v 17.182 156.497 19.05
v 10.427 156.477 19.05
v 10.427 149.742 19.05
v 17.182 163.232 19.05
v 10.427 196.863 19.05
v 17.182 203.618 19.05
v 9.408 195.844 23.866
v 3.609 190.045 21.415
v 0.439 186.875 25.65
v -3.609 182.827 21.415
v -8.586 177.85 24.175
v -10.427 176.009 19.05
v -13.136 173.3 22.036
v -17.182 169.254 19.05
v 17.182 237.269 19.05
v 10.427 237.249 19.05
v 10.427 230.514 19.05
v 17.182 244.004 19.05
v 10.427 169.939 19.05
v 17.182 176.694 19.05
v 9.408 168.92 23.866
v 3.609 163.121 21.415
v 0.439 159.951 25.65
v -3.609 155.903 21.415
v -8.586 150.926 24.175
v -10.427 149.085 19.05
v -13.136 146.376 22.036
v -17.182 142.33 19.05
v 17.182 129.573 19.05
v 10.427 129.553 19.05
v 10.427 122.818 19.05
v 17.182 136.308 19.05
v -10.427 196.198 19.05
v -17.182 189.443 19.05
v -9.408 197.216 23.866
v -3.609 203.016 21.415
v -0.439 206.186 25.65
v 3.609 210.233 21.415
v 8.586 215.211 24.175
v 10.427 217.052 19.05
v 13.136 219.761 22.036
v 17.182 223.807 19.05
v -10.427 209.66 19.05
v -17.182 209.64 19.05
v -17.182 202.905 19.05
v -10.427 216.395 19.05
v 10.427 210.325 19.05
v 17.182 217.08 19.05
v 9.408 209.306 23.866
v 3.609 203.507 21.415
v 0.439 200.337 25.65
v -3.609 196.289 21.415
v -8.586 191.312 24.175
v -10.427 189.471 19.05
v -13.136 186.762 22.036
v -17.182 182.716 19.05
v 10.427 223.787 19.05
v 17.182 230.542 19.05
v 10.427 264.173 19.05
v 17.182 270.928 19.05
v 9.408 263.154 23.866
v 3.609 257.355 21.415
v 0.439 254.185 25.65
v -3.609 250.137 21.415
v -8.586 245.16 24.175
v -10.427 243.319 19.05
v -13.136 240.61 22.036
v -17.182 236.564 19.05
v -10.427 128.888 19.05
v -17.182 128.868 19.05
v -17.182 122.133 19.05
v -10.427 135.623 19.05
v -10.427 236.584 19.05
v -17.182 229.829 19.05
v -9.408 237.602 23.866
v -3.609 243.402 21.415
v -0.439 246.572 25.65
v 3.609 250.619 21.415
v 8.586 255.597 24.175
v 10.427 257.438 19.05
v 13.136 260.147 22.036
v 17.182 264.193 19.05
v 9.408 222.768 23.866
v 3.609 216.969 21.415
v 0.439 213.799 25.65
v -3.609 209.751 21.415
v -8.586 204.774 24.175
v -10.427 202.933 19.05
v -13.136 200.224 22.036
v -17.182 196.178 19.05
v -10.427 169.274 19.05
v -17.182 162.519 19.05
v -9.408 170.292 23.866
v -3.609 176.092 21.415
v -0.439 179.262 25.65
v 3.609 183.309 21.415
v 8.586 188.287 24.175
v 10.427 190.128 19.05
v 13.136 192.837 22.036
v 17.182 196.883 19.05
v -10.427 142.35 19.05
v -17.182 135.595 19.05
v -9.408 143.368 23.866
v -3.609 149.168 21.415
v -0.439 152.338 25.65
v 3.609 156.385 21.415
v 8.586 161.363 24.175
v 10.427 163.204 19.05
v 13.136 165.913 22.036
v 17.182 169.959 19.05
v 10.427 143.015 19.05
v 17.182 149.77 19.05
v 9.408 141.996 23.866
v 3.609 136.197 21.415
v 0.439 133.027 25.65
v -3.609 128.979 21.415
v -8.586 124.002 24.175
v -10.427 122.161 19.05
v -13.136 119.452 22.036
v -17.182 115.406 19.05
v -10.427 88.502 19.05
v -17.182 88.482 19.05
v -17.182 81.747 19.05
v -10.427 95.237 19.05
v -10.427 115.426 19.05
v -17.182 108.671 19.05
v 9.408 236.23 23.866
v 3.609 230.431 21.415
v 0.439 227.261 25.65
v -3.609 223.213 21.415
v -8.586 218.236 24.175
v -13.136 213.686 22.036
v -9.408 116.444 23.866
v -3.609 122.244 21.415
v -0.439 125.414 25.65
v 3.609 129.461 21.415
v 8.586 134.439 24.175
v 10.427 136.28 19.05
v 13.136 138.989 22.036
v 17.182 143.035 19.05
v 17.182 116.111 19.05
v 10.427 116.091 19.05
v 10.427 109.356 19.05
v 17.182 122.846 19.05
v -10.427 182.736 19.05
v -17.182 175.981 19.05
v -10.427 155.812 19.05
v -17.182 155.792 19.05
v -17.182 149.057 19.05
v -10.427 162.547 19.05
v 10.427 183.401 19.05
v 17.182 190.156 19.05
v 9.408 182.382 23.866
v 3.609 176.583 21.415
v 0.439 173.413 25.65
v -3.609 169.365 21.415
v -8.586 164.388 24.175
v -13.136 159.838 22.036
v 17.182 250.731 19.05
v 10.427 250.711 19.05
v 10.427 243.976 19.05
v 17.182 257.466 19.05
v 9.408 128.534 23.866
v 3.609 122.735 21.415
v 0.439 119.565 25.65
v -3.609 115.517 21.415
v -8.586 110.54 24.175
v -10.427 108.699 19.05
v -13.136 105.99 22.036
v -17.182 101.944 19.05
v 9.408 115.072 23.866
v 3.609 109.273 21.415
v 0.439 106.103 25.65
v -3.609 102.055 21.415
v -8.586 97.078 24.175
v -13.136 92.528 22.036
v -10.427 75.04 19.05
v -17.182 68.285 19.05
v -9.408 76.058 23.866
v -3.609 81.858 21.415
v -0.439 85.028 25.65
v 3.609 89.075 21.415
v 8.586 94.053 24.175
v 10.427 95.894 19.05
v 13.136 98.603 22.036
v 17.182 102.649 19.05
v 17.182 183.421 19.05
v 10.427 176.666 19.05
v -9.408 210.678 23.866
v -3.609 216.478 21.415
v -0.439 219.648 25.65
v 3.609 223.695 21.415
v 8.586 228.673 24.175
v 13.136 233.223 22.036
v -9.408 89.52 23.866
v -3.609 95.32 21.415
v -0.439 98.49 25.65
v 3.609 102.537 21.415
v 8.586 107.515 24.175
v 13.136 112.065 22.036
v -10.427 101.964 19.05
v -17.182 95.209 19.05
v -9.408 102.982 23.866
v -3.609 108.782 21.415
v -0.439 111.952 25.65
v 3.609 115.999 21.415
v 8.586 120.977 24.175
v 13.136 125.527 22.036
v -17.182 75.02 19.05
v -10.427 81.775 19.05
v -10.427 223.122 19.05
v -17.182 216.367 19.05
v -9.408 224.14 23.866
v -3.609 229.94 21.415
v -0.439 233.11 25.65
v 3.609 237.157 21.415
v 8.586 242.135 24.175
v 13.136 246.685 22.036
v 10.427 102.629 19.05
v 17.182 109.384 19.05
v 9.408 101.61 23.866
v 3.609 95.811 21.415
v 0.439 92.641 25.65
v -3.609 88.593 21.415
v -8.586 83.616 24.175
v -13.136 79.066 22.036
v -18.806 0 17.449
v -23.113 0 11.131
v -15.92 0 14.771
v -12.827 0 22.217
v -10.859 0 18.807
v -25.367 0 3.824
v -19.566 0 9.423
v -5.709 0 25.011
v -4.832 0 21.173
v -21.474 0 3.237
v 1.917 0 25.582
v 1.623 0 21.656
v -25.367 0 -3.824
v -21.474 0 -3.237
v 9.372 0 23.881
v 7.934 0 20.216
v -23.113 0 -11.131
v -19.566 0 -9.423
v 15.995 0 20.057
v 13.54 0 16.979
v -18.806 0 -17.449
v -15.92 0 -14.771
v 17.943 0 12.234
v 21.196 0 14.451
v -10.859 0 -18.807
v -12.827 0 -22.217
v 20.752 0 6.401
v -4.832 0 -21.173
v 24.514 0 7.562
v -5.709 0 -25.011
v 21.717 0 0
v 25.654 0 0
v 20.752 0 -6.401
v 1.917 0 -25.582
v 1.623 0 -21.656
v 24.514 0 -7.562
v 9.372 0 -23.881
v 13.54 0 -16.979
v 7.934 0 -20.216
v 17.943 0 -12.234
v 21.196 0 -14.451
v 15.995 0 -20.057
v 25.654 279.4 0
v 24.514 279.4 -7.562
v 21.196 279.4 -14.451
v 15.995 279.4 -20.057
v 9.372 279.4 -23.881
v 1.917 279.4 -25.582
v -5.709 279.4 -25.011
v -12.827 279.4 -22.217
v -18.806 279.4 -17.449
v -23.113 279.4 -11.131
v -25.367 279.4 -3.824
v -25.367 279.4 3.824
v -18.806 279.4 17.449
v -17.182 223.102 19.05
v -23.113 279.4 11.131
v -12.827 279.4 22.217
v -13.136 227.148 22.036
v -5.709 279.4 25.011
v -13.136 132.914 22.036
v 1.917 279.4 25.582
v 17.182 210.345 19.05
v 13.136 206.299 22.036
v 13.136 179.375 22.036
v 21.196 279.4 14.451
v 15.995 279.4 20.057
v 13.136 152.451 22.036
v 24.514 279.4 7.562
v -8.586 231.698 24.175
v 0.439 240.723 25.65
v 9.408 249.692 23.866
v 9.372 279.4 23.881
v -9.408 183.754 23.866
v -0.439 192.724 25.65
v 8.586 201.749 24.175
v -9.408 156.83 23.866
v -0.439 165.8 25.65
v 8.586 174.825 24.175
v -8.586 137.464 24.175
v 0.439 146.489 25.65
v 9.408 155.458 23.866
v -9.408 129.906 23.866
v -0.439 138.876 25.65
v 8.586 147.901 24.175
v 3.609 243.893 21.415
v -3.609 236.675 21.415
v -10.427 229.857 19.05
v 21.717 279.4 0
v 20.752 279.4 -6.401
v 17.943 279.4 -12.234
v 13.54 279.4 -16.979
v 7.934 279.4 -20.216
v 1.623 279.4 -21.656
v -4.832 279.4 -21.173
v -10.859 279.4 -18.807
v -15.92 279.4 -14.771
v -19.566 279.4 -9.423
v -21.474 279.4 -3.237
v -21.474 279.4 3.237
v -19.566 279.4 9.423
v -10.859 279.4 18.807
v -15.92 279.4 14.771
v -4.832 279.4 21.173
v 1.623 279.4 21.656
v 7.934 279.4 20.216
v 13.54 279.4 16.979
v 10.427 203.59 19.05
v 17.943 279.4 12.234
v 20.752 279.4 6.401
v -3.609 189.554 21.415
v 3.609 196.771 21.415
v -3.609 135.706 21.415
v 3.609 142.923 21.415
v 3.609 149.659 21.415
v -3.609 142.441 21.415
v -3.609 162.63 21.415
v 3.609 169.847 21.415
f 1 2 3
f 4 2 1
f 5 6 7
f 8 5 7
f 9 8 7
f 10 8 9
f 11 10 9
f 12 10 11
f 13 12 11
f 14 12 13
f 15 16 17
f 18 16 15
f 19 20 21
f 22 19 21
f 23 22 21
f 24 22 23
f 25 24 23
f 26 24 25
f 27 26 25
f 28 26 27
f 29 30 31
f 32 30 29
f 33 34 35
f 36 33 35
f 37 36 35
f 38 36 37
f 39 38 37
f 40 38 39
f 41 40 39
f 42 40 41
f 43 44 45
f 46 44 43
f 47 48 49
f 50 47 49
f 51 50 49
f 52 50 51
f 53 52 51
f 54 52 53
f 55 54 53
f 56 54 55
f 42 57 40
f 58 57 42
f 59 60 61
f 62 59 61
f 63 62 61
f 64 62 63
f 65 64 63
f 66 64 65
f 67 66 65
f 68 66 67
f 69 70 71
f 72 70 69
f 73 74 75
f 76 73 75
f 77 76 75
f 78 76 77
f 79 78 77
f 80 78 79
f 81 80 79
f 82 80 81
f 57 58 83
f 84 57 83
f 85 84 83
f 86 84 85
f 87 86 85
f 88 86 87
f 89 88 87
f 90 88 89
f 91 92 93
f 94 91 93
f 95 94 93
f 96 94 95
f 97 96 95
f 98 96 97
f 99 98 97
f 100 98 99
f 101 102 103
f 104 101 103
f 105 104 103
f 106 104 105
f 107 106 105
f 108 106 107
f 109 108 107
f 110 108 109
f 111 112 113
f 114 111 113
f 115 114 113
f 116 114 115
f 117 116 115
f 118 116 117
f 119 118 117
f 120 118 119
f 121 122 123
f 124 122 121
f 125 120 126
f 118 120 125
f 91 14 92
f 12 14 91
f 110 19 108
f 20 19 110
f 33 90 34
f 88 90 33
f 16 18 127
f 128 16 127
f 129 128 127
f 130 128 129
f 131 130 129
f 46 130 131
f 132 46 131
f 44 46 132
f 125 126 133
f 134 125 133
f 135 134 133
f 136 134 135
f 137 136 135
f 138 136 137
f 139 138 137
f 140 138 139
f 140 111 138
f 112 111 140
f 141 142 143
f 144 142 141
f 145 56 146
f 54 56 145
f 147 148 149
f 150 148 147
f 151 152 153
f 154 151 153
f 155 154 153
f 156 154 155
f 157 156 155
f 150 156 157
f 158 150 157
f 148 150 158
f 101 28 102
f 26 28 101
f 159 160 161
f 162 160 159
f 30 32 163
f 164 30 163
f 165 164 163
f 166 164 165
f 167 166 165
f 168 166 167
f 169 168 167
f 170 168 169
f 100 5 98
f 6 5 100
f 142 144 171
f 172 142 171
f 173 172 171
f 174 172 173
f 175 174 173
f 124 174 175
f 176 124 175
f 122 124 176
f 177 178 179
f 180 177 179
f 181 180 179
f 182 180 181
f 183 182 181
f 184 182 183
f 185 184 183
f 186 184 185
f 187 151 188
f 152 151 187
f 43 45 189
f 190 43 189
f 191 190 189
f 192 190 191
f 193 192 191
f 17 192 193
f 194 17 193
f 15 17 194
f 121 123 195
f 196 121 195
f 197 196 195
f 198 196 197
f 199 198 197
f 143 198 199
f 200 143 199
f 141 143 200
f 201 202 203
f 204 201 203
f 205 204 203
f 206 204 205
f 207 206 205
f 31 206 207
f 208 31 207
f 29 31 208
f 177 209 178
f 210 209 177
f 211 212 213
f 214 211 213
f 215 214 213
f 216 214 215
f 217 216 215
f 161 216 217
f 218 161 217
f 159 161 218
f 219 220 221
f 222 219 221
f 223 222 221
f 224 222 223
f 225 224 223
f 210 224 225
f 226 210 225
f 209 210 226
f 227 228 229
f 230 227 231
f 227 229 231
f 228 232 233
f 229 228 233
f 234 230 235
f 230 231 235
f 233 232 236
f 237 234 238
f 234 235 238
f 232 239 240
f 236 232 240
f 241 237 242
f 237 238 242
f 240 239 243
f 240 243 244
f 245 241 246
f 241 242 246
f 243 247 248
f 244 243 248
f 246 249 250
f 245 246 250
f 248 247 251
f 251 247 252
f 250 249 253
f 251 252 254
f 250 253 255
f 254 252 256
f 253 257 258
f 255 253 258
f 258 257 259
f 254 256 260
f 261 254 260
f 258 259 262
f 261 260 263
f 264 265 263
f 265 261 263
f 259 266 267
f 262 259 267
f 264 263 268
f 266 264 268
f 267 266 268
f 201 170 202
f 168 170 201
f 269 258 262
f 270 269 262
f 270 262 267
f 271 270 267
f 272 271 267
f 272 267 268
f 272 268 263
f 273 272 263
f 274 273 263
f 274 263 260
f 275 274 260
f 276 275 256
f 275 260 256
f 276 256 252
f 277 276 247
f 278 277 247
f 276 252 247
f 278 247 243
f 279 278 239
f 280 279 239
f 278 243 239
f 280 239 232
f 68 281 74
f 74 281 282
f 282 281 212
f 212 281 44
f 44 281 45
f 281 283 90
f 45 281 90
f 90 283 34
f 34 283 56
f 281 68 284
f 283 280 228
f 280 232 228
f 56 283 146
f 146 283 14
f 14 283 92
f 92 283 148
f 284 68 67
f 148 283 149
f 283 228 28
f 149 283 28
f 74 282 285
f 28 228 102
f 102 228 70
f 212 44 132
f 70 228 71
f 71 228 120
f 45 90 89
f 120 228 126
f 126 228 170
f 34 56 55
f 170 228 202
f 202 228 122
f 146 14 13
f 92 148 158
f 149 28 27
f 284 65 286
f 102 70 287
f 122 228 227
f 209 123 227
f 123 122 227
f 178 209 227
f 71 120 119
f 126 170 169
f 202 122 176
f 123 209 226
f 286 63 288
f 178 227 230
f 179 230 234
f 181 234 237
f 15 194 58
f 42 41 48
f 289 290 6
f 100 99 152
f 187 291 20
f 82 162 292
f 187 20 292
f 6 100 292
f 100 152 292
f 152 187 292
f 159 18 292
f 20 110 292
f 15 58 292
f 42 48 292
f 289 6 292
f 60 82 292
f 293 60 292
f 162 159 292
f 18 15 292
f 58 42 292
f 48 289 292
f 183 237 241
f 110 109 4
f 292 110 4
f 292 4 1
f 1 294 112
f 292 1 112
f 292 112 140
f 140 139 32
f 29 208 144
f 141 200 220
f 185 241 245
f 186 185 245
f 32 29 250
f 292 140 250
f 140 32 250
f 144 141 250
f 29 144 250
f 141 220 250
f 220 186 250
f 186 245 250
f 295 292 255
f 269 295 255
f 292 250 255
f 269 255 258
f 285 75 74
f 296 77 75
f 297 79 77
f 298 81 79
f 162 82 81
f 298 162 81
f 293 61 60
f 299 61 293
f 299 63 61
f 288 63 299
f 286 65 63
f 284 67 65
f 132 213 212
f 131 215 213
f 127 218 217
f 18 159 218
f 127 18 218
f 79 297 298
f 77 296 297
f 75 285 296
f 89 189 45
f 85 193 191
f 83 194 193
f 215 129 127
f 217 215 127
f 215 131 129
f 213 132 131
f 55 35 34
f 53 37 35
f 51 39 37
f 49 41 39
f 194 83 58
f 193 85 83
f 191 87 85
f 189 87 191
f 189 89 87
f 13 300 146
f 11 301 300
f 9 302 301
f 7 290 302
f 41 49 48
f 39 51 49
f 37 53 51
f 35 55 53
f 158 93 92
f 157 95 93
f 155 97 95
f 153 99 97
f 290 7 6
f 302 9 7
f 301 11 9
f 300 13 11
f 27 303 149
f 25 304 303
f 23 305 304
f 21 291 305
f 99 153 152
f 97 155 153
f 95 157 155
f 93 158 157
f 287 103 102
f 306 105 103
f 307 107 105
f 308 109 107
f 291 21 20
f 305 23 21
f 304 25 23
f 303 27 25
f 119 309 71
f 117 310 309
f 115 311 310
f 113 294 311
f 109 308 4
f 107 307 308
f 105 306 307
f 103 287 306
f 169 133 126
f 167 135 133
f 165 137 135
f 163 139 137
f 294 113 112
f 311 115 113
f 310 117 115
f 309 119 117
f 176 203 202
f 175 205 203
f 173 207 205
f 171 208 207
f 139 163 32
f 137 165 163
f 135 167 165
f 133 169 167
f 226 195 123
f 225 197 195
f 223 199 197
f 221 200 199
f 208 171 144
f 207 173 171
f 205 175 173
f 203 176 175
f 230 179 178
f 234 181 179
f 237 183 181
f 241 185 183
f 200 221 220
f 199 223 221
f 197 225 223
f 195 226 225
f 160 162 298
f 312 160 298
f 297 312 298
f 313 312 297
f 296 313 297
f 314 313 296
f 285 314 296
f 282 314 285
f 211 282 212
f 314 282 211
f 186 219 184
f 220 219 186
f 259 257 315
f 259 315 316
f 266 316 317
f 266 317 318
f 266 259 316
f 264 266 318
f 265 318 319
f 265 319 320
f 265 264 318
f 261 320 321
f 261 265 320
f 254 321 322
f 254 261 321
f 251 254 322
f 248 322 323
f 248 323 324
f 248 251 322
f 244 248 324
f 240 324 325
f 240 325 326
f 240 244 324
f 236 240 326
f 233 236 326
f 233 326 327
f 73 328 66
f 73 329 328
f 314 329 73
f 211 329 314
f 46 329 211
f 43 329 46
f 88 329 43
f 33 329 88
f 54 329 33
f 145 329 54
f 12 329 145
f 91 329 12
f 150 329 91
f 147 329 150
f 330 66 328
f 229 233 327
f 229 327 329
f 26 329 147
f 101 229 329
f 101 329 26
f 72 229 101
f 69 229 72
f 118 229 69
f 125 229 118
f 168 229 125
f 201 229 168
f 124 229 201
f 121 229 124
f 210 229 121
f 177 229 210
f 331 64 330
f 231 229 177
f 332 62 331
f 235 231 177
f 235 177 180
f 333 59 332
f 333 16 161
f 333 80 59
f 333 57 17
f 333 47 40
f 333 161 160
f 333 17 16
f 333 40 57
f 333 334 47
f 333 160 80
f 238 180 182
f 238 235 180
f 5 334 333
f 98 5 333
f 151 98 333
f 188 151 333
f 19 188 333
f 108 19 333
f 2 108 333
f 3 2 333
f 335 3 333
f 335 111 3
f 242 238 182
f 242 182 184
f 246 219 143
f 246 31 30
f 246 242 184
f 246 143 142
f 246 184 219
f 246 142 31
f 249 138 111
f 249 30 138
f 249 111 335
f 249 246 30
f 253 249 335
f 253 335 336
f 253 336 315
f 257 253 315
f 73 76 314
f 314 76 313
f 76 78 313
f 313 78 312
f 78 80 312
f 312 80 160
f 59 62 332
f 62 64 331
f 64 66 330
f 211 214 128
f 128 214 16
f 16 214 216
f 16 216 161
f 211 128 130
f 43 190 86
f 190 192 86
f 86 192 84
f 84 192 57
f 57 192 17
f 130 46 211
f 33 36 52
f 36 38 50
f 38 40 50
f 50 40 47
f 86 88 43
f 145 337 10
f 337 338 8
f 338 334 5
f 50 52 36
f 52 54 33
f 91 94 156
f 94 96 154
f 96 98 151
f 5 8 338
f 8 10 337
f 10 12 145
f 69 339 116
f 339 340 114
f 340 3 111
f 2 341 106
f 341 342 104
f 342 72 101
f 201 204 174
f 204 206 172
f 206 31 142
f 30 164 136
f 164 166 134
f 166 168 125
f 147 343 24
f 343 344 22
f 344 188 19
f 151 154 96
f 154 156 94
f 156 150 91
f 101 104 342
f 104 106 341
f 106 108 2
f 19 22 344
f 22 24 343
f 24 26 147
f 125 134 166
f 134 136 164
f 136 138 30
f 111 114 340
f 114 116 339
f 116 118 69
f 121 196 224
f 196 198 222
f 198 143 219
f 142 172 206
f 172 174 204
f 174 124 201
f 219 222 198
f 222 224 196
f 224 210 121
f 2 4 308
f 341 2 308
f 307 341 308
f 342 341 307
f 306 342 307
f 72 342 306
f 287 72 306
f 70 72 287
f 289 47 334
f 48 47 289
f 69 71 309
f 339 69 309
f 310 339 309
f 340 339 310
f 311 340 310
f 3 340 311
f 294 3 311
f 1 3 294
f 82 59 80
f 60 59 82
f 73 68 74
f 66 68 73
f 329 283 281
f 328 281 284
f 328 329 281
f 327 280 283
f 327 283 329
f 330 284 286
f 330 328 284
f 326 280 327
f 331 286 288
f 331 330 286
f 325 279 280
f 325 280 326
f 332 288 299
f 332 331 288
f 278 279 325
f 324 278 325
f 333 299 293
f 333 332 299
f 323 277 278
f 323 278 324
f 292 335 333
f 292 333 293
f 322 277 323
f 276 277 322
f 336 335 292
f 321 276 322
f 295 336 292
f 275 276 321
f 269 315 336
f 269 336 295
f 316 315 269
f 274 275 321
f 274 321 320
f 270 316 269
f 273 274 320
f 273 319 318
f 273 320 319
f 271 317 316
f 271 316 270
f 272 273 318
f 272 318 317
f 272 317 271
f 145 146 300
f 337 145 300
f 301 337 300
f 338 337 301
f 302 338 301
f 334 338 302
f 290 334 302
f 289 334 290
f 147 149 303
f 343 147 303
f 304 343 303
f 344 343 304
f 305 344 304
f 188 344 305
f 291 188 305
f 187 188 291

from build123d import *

# Parameters (mm, degrees)
SKETCH1_R           = 25.654
SKETCH1_R_2         = 21.717
BOSS_EXTRUDE1_DEPTH = 279.4
CUT_EXTRUDE1_START  = 19.05
CUT_EXTRUDE1_DEPTH  = 12.7
LPATTERN1_COUNT     = 13
LPATTERN1_PITCH     = 13.462


with BuildPart() as part:
    # Sketch1 → Boss-Extrude1 (new body)
    with BuildSketch(Plane(origin=(0, 0, 0), x_dir=(1, 0, 0), z_dir=(0, 1, 0))):
        Circle(SKETCH1_R)
        Circle(SKETCH1_R_2, mode=Mode.SUBTRACT)
    extrude(amount=BOSS_EXTRUDE1_DEPTH)

    # Sketch2 → Cut-Extrude1 (cut)
    with BuildSketch(Plane.XY.offset(CUT_EXTRUDE1_START)):
        Polygon((-29.021596045, 224.724403955), (-25.654, 221.356807909), (29.021596045, 276.032403955), (25.654, 279.4), align=None)
    cut_extrude1 = extrude(amount=CUT_EXTRUDE1_DEPTH, mode=Mode.SUBTRACT)

    # LPattern1: Cut-Extrude1 ×13
    with Locations(*[(0, -i * LPATTERN1_PITCH, 0) for i in range(1, LPATTERN1_COUNT)]):
        add(cut_extrude1, mode=Mode.SUBTRACT)


solid = part.part
